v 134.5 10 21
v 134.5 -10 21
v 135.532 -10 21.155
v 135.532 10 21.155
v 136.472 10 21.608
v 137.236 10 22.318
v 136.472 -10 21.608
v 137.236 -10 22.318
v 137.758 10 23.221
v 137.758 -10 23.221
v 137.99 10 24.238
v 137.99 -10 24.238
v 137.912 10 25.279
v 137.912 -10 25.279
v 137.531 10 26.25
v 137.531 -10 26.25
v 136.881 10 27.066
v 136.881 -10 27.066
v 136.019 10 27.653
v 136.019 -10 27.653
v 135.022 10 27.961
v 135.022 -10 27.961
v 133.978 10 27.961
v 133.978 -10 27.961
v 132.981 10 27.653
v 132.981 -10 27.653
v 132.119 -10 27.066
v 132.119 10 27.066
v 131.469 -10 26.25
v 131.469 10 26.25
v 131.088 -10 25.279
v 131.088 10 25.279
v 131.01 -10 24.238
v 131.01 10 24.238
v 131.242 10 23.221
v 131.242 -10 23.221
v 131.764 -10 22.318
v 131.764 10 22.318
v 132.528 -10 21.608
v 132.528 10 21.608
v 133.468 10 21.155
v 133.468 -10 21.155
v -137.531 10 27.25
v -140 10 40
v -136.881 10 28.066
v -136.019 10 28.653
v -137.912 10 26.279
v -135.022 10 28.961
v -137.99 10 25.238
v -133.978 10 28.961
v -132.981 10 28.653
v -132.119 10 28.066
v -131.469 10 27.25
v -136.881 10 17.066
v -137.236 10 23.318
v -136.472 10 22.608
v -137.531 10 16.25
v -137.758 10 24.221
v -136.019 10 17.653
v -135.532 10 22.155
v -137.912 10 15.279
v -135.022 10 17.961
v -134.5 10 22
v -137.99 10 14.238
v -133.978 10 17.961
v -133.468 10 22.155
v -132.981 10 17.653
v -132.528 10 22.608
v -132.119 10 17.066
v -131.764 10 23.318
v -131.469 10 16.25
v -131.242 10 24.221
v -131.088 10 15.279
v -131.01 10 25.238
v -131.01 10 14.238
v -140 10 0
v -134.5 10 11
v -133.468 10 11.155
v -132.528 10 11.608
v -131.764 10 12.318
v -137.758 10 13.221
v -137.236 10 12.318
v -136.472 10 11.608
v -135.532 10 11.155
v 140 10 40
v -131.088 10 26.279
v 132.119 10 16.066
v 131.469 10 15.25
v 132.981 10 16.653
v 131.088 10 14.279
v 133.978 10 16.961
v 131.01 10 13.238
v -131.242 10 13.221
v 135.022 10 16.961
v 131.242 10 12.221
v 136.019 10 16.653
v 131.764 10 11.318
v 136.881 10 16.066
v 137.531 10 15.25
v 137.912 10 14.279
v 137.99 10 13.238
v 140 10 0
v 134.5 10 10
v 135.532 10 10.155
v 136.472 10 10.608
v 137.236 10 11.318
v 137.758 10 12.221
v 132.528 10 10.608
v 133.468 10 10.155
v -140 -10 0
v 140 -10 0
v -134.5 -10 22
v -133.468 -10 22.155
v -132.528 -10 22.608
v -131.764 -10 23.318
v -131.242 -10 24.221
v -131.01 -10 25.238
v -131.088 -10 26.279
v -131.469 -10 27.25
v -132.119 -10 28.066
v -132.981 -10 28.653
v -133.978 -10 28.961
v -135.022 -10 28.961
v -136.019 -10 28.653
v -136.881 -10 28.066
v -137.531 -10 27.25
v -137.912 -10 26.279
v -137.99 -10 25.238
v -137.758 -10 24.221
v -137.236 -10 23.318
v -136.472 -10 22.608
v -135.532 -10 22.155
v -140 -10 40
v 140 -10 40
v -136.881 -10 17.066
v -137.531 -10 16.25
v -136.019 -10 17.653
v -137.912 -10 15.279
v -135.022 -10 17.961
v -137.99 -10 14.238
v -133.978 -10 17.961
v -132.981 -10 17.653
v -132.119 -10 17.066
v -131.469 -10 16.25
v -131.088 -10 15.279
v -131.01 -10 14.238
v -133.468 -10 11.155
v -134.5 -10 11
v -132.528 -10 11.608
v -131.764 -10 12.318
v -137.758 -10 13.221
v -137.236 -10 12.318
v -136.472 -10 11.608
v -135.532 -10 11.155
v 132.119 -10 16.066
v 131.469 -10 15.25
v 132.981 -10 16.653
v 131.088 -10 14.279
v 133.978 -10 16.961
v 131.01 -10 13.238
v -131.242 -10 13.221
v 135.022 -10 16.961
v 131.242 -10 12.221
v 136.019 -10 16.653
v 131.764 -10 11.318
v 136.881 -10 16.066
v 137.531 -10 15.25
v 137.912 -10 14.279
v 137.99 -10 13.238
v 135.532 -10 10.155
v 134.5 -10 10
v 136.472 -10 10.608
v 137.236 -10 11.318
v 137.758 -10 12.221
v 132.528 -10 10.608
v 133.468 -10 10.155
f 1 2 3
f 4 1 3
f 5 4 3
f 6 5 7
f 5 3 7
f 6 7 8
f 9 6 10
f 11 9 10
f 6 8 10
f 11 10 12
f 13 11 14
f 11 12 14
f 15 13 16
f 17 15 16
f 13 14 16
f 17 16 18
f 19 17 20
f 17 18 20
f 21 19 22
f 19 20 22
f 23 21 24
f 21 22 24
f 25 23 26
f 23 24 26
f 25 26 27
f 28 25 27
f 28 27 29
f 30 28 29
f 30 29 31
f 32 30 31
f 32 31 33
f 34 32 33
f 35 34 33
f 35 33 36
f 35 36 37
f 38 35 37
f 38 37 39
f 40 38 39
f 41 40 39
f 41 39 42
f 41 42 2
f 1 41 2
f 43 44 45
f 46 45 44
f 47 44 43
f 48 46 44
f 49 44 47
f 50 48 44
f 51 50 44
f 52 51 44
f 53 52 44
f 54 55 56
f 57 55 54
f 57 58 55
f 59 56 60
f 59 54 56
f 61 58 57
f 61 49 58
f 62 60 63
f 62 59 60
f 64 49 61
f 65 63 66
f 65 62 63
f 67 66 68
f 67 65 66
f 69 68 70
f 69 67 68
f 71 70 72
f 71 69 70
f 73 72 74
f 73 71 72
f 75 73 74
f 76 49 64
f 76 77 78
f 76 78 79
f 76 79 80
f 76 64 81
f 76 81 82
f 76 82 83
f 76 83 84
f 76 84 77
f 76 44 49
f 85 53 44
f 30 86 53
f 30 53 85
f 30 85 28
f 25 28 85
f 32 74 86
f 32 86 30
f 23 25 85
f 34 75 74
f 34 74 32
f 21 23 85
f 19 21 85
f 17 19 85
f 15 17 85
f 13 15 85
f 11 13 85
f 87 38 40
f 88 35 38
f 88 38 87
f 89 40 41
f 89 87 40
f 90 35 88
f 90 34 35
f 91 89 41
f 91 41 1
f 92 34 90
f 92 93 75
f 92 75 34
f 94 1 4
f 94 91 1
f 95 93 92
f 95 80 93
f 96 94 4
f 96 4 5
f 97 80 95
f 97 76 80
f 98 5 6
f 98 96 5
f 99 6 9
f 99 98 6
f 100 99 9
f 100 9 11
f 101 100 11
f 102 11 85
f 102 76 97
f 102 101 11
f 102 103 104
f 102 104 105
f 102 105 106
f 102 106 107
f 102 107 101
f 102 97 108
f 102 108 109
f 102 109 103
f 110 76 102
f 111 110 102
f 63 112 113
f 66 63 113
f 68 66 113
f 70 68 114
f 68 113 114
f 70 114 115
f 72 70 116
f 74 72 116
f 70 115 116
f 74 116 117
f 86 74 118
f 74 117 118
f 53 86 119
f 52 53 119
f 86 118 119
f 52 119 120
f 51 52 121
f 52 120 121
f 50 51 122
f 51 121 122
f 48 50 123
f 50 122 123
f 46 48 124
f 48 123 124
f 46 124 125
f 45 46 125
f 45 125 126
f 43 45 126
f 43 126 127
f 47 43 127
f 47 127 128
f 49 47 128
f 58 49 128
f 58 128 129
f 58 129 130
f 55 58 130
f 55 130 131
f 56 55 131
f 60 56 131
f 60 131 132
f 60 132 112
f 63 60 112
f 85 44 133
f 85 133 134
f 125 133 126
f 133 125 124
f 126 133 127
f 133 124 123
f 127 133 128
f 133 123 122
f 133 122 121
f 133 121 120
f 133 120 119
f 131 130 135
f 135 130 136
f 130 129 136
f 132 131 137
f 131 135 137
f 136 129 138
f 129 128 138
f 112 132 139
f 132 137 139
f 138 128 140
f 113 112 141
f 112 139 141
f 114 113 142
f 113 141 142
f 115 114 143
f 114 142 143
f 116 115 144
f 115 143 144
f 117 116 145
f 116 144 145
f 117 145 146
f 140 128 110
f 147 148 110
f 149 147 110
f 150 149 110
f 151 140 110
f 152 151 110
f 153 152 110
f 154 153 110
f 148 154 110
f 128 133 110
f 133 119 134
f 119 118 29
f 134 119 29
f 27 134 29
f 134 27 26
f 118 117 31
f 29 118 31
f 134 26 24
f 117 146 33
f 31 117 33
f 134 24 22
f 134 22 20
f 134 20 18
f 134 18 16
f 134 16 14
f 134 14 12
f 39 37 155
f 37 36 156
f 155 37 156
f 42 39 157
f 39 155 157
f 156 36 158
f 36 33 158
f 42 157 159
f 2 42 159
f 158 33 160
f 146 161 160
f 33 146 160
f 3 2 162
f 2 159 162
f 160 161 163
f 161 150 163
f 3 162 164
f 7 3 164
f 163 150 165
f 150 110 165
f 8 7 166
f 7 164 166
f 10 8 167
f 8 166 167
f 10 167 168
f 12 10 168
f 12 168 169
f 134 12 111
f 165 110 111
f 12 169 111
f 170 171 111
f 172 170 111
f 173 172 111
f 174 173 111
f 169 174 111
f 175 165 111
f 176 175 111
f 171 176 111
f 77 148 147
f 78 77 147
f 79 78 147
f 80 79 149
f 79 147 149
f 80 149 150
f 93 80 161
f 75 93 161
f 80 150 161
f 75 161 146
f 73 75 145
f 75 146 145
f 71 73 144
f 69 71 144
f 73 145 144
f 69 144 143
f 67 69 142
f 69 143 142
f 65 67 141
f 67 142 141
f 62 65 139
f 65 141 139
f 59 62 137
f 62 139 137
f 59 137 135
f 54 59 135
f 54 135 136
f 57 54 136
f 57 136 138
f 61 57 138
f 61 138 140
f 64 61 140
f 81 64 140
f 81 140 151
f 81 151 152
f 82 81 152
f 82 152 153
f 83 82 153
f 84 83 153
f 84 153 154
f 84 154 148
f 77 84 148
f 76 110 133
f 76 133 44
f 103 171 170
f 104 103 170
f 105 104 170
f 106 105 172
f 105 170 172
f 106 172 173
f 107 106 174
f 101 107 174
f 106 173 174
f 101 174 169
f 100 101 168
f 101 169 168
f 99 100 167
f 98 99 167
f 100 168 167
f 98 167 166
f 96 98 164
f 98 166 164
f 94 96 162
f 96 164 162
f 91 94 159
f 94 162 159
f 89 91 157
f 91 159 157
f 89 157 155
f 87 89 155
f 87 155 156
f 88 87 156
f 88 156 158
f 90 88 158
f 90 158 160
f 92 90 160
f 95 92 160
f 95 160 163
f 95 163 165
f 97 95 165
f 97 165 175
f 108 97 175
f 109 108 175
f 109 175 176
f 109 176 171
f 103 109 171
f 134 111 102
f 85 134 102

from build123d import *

# Parameters (mm, degrees)
SKETCH_1_W          = 280
SKETCH_1_H          = 20
EXTRUDE_1_DEPTH     = 40
SKETCH_2_R          = 3.5
CUT_EXTRUDE_1_DEPTH = 30


with BuildPart() as part:
    # 스케치1 → 보스-돌출1 (new body)
    with BuildSketch(Plane.XY):
        Rectangle(SKETCH_1_W, SKETCH_1_H)
    extrude(amount=EXTRUDE_1_DEPTH)

    # 스케치2 → 컷-돌출1 (cut)
    with BuildSketch(Plane.XZ.offset(10)):
        with Locations(Location((-134.5, 25.5, 0), (0, 0, 270))):
            Circle(SKETCH_2_R)
        with Locations(Location((-134.5, 14.5, 0), (0, 0, 270))):
            Circle(SKETCH_2_R)
        with Locations(Location((134.5, 24.5, 0), (0, 0, 270))):
            Circle(SKETCH_2_R)
        with Locations(Location((134.5, 13.5, 0), (0, 0, 270))):
            Circle(SKETCH_2_R)
    extrude(amount=-CUT_EXTRUDE_1_DEPTH, mode=Mode.SUBTRACT)


solid = part.part
